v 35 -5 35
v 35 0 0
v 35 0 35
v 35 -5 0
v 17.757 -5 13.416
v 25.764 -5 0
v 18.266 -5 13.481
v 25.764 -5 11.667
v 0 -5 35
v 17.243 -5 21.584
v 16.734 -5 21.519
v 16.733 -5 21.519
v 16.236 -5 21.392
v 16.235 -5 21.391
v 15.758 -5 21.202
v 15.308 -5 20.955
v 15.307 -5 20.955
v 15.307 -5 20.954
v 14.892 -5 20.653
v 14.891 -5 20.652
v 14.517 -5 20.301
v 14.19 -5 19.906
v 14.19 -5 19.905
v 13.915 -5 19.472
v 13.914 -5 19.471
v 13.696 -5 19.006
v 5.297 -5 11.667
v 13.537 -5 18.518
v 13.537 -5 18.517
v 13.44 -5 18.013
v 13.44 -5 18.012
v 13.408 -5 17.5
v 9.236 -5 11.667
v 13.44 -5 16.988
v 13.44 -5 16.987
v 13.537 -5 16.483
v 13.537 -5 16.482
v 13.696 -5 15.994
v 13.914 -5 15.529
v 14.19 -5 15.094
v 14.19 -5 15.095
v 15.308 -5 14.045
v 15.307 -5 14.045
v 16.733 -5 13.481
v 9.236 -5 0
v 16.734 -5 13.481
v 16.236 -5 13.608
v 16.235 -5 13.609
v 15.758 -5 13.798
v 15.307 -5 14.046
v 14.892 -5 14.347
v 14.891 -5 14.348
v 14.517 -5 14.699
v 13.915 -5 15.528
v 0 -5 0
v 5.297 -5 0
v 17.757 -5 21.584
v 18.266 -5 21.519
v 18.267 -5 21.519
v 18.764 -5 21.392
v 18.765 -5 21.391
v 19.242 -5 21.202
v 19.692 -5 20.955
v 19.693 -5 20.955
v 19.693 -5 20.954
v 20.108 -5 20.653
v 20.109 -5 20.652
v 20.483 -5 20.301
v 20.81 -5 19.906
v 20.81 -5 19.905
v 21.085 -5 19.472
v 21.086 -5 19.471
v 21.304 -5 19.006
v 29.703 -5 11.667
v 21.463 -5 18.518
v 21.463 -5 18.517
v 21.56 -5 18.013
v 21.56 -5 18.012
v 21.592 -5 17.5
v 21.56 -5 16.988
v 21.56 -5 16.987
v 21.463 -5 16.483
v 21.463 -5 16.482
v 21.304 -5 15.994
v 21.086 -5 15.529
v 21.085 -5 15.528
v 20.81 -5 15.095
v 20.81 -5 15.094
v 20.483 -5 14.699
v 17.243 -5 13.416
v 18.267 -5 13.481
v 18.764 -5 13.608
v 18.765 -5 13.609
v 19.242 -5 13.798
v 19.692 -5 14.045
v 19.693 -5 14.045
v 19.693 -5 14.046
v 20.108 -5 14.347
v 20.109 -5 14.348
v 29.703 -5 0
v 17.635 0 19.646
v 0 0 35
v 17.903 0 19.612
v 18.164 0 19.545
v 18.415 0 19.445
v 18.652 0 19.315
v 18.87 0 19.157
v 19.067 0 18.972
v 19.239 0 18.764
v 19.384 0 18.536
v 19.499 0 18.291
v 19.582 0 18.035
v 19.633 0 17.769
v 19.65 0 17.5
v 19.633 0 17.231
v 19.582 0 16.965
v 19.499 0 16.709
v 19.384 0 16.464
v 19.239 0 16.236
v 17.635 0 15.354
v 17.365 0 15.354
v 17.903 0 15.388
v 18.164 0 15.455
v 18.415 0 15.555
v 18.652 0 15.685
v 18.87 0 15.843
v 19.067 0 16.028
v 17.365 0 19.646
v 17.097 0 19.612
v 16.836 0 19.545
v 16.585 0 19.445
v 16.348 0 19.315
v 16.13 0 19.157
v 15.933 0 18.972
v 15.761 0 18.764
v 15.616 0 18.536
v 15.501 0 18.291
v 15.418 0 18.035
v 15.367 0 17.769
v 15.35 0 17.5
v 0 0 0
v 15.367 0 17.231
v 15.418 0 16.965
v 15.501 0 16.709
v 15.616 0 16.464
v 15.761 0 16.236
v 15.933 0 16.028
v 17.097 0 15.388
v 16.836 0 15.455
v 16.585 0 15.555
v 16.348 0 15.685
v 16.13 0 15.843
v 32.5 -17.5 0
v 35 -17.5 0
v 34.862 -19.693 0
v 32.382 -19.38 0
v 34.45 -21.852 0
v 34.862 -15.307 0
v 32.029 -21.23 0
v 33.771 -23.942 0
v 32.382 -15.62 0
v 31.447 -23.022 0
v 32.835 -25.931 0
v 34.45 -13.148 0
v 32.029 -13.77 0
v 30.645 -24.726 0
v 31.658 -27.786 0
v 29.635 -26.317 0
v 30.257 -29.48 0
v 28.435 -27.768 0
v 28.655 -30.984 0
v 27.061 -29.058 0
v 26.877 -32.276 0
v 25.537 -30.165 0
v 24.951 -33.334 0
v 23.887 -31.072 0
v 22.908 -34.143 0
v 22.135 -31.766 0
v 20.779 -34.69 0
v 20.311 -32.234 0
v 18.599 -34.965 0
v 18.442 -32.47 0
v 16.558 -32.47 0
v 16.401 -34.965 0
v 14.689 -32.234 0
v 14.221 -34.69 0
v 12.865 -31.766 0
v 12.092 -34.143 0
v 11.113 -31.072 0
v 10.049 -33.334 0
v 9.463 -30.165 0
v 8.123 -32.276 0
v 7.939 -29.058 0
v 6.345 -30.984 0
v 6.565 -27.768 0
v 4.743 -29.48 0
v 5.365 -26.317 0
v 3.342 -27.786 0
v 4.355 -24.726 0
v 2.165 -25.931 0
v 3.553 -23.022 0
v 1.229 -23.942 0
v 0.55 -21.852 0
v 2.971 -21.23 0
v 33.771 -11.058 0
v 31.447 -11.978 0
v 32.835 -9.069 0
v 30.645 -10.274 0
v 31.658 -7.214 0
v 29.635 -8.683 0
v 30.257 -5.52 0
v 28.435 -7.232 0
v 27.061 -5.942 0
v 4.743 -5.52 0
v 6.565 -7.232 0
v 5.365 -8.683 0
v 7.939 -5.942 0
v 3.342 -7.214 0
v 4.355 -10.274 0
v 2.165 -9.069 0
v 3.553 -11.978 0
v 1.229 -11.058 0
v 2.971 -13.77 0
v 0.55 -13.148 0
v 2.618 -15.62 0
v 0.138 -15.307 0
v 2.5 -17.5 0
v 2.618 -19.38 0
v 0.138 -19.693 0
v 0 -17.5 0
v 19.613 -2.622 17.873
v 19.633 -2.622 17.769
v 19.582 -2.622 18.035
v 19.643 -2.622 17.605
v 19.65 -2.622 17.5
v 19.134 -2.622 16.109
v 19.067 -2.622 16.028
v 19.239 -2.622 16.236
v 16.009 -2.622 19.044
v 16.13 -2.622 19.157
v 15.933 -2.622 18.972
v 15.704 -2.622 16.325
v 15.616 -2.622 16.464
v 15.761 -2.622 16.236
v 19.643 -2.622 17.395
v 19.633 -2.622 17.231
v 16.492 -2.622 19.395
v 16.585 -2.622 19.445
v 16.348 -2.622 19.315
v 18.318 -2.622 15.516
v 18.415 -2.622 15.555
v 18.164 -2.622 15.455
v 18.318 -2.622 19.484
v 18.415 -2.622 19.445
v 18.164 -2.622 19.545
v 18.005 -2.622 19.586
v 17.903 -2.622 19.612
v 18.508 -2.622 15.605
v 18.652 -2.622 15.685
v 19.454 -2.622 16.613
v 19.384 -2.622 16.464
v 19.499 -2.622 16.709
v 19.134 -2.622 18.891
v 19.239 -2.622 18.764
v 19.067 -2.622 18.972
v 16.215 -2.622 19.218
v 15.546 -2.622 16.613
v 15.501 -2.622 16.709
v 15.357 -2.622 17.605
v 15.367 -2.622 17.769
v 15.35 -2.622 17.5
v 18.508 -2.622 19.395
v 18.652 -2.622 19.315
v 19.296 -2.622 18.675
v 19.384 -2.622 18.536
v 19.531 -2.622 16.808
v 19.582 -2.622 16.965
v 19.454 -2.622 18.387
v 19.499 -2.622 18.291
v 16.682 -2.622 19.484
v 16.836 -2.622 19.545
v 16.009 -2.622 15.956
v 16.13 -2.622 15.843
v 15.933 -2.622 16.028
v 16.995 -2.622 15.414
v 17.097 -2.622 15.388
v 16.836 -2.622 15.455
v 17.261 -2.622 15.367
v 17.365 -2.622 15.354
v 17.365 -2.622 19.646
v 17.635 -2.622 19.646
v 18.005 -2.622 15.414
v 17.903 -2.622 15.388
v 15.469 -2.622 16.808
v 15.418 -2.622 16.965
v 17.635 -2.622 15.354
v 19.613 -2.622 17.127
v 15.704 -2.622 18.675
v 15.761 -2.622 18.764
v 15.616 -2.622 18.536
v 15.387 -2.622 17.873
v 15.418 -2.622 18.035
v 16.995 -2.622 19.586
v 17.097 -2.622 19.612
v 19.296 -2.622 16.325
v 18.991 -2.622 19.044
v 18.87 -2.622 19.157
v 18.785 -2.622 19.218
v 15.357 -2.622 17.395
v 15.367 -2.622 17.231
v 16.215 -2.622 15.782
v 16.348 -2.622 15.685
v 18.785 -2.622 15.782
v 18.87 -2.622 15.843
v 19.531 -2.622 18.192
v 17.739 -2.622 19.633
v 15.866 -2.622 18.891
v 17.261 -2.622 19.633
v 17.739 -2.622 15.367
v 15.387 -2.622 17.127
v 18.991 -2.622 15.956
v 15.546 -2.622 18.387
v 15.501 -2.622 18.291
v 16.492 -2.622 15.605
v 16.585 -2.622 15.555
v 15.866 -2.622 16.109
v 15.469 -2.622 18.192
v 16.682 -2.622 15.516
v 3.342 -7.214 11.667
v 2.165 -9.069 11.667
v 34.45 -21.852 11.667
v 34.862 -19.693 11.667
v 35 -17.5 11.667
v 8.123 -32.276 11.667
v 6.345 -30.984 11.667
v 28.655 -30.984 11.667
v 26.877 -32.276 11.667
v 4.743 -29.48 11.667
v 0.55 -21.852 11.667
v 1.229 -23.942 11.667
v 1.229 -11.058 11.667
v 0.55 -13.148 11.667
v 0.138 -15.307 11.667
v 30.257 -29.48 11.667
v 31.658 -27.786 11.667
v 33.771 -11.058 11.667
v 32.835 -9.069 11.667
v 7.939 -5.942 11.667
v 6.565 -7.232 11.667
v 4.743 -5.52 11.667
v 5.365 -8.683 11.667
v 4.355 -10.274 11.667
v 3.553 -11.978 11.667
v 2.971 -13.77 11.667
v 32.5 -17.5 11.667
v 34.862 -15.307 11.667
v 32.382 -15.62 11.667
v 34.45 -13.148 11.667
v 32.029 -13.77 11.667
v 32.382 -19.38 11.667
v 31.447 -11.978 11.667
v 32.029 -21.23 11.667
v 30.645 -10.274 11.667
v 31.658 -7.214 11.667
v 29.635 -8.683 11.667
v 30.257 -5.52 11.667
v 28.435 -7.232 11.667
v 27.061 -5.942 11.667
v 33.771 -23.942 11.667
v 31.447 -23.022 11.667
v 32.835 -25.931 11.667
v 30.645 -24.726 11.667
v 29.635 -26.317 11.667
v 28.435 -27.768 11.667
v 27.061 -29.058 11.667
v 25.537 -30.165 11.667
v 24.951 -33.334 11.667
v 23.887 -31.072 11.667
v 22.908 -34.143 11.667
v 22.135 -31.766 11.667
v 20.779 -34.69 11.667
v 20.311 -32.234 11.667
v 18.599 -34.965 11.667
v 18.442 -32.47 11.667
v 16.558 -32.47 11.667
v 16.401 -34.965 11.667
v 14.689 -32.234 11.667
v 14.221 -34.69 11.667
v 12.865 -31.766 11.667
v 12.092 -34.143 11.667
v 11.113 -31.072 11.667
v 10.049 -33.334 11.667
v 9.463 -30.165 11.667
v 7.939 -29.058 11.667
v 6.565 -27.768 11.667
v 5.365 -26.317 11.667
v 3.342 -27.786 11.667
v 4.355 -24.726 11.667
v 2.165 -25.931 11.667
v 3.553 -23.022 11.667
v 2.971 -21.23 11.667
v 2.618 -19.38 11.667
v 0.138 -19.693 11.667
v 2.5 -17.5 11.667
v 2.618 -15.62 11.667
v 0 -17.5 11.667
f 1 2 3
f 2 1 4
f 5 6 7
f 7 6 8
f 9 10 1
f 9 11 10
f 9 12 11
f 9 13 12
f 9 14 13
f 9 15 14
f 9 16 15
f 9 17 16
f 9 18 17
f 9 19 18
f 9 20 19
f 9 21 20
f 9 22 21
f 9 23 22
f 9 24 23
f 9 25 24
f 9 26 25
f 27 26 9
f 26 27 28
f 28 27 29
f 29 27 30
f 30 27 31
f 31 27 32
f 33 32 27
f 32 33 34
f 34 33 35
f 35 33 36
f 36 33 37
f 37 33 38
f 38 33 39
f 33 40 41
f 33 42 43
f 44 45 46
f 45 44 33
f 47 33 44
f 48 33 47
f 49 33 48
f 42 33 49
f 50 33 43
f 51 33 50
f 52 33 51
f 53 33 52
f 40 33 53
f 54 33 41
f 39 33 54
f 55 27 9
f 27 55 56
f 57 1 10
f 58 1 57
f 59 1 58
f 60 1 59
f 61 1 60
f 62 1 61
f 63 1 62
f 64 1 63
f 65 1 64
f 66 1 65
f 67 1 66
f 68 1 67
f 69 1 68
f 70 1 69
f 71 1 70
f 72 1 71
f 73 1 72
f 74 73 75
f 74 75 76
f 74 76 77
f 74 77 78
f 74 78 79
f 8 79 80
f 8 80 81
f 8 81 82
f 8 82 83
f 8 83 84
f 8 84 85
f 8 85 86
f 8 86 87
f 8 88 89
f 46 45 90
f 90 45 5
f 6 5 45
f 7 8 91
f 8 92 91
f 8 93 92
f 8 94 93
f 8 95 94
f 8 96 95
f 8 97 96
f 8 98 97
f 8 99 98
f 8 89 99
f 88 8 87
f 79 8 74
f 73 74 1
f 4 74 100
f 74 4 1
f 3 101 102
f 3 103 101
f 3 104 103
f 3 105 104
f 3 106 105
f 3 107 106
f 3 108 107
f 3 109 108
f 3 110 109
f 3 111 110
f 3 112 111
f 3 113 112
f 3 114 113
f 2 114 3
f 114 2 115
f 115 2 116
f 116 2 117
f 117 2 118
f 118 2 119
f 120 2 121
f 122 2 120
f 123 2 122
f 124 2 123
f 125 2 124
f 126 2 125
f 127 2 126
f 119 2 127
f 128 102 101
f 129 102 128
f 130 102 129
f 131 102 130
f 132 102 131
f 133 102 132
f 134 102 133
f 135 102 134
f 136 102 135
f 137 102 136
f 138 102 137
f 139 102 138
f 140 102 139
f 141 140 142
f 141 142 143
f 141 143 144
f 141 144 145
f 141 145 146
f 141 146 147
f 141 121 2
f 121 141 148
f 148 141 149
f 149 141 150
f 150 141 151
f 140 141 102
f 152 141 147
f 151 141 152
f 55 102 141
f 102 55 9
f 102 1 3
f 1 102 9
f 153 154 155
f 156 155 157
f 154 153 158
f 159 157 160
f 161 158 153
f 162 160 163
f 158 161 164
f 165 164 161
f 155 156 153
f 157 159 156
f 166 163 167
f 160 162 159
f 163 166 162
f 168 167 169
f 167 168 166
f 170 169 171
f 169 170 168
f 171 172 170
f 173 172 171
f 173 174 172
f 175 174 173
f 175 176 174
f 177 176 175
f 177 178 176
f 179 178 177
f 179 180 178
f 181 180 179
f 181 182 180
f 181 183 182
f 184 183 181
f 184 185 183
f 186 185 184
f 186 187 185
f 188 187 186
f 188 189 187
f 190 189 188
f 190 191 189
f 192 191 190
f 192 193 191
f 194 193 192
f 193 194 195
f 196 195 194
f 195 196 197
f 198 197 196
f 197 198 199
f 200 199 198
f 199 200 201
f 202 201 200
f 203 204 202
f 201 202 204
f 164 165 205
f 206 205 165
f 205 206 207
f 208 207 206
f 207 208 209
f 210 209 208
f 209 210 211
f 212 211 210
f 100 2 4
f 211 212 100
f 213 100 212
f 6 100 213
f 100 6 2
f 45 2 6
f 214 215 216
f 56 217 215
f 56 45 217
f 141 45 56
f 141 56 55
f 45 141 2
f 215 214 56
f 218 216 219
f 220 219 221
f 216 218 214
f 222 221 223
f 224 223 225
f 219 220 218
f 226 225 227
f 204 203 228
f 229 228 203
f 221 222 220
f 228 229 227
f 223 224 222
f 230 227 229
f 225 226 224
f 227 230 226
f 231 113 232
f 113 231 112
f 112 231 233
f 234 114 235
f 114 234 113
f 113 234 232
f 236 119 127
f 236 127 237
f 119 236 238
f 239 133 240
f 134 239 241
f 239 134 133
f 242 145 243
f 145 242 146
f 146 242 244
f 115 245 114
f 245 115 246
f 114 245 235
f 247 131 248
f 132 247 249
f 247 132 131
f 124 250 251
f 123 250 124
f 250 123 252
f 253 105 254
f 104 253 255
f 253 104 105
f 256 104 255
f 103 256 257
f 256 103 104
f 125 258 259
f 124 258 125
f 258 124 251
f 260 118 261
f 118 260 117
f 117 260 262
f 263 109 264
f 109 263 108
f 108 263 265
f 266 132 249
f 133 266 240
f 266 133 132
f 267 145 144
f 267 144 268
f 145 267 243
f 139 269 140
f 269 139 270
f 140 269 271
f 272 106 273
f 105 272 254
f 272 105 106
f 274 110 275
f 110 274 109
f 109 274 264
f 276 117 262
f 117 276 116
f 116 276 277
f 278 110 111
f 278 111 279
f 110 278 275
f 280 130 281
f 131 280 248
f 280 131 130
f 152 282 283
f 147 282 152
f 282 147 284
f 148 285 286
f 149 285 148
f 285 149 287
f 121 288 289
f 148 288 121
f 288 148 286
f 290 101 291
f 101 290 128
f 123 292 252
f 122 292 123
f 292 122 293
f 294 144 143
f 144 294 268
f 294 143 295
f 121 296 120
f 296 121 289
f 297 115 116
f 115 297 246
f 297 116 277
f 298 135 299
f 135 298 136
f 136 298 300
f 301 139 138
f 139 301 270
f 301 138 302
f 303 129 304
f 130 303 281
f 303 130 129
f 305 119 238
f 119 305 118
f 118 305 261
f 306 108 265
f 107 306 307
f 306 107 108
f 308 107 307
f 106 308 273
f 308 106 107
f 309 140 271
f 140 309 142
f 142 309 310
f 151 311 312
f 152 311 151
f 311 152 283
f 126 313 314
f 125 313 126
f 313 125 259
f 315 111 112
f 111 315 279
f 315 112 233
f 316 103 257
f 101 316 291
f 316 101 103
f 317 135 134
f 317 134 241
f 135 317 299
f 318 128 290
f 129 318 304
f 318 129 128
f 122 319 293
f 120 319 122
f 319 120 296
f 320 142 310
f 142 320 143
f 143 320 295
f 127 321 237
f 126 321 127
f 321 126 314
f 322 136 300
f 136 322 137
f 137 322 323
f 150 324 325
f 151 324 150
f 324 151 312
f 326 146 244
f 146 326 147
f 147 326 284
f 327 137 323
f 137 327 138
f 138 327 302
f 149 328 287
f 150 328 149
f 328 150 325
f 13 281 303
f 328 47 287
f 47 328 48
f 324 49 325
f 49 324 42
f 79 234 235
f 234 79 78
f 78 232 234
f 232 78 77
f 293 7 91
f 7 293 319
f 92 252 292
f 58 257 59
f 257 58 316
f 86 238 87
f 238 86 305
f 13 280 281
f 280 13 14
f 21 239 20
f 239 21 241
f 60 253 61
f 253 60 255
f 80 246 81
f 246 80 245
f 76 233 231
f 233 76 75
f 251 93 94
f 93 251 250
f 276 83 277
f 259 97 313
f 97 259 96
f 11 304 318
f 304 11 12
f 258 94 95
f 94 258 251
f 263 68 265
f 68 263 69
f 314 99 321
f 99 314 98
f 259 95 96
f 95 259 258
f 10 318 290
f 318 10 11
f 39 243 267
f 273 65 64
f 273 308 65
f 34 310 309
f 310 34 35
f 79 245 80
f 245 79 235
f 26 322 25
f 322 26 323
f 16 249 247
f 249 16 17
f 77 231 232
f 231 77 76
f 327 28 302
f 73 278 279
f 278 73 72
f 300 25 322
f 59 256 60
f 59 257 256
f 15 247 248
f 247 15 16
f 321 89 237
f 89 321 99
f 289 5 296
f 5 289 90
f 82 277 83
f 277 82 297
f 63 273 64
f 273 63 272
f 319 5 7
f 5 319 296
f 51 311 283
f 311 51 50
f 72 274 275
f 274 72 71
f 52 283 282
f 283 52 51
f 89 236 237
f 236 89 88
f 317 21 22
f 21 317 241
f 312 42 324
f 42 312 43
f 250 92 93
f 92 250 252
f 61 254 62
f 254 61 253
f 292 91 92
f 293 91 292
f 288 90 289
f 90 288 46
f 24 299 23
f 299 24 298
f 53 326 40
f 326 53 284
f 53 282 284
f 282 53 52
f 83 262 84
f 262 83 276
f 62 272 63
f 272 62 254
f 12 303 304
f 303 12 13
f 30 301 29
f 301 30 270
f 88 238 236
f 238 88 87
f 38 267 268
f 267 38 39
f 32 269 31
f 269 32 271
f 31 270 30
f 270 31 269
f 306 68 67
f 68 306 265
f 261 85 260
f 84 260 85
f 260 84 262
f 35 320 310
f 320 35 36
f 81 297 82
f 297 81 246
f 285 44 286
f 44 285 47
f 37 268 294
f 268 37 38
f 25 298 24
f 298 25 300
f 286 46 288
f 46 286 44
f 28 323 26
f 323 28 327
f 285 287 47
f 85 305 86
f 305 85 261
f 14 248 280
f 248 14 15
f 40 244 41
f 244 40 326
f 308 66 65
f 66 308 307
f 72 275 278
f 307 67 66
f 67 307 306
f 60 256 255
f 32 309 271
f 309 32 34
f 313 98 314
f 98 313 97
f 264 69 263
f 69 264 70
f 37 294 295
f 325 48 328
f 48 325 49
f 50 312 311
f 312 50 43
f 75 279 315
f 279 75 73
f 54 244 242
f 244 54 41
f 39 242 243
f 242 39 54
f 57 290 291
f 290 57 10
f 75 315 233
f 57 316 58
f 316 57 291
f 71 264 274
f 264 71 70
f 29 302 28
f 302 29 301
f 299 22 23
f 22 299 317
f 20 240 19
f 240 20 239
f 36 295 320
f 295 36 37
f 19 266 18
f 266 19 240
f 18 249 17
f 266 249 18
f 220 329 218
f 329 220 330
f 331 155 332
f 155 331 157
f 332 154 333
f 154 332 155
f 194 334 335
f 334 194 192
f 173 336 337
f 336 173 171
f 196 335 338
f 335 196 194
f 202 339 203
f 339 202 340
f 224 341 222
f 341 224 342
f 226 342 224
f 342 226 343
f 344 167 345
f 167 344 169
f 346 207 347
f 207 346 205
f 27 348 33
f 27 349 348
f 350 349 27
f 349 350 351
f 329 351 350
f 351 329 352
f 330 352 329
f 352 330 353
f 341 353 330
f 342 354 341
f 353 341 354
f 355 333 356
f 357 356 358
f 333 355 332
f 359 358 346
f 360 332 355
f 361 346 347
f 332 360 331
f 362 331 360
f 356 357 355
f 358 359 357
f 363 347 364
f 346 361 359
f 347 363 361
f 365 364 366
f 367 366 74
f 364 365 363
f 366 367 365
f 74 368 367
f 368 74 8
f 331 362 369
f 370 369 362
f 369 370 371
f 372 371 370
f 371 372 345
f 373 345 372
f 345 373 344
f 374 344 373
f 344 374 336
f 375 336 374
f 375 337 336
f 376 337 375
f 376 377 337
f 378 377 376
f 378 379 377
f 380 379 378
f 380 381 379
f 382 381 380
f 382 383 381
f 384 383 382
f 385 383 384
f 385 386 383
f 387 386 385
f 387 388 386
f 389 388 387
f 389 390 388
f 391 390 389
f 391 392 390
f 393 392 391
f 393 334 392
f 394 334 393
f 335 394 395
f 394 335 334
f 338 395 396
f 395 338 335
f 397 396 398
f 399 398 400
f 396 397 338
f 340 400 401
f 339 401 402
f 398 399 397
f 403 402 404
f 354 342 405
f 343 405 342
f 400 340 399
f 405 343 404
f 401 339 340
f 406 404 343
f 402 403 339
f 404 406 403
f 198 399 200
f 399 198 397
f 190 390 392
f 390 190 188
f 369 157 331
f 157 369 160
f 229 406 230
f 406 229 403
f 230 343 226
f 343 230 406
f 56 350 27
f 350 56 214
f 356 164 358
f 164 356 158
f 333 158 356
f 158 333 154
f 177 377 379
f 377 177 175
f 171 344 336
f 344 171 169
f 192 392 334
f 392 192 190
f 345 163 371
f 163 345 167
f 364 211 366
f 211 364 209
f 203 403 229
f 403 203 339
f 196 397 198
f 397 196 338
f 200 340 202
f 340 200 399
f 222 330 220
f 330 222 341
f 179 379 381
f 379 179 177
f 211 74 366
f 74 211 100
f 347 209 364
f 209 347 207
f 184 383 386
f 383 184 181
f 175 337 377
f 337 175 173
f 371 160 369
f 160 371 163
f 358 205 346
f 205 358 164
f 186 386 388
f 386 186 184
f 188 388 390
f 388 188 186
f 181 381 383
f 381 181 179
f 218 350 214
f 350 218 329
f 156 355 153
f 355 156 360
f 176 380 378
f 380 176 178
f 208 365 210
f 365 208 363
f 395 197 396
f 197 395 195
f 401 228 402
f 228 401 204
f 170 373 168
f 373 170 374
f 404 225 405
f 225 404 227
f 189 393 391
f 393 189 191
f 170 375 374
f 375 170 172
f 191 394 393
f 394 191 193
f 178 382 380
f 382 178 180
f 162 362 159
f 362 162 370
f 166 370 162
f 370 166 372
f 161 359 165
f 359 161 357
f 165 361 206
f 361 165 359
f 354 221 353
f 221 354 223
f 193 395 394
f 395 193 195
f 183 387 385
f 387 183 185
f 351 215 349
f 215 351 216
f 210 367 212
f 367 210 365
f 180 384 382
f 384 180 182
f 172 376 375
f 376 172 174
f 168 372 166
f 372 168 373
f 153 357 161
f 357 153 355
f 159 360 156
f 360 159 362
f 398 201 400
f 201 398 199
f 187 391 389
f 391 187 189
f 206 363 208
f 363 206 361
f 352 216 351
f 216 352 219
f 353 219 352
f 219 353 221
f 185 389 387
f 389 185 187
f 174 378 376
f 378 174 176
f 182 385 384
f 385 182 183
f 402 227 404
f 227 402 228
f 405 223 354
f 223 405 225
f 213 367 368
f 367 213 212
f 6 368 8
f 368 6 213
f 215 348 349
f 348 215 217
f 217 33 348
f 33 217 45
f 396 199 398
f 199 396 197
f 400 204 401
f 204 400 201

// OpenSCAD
$fn = 50;

width = 35;
depth = 5;

// /////////////////////////////////////////////////////////////////////////////
// Backing plate

module backplate(width, height) {
  screw_r = 4.3/2;
  head_or = 8.2/2;
  head_ir = 3.3/2;
  head_h  = 3;

  difference() {
    cube([width, height, depth]);

    translate([width/2, height-(width/2), -1])
    cylinder(r=screw_r, h=depth+2); 

    translate([width/2, height-(width/2), depth+0.01-head_h])
    cylinder(r1=head_ir, r2=head_or, h=head_h);
  }
}

// /////////////////////////////////////////////////////////////////////////////
// Retainer cup


module cup_body() {
  translate([width/2, width/3, width/2])
  rotate([90, 0, 0])
  cylinder(d=width, h=width/3);
}

module cup_cutout() {
  translate([width/2, width, width/2])
  rotate([90, 0, 0])
  cylinder(d=width-depth, h=width*2);
}

// /////////////////////////////////////////////////////////////////////////////
// Housing holder

module housing_holder() {
  backplate(width, width*2);
  difference() {
    union() {
      cup_body();

      cup_sideplate();

      translate([width-depth, 0, 0])
      cup_sideplate();
    }
    cup_cutout();
  }
}

module guide() {
  backplate(width, width);
  difference() {
    cup_body();
    cup_cutout();
  }
}

// rotate([90, 0, 0])
// housing_holder();

rotate([90, 0, 0])
guide();
